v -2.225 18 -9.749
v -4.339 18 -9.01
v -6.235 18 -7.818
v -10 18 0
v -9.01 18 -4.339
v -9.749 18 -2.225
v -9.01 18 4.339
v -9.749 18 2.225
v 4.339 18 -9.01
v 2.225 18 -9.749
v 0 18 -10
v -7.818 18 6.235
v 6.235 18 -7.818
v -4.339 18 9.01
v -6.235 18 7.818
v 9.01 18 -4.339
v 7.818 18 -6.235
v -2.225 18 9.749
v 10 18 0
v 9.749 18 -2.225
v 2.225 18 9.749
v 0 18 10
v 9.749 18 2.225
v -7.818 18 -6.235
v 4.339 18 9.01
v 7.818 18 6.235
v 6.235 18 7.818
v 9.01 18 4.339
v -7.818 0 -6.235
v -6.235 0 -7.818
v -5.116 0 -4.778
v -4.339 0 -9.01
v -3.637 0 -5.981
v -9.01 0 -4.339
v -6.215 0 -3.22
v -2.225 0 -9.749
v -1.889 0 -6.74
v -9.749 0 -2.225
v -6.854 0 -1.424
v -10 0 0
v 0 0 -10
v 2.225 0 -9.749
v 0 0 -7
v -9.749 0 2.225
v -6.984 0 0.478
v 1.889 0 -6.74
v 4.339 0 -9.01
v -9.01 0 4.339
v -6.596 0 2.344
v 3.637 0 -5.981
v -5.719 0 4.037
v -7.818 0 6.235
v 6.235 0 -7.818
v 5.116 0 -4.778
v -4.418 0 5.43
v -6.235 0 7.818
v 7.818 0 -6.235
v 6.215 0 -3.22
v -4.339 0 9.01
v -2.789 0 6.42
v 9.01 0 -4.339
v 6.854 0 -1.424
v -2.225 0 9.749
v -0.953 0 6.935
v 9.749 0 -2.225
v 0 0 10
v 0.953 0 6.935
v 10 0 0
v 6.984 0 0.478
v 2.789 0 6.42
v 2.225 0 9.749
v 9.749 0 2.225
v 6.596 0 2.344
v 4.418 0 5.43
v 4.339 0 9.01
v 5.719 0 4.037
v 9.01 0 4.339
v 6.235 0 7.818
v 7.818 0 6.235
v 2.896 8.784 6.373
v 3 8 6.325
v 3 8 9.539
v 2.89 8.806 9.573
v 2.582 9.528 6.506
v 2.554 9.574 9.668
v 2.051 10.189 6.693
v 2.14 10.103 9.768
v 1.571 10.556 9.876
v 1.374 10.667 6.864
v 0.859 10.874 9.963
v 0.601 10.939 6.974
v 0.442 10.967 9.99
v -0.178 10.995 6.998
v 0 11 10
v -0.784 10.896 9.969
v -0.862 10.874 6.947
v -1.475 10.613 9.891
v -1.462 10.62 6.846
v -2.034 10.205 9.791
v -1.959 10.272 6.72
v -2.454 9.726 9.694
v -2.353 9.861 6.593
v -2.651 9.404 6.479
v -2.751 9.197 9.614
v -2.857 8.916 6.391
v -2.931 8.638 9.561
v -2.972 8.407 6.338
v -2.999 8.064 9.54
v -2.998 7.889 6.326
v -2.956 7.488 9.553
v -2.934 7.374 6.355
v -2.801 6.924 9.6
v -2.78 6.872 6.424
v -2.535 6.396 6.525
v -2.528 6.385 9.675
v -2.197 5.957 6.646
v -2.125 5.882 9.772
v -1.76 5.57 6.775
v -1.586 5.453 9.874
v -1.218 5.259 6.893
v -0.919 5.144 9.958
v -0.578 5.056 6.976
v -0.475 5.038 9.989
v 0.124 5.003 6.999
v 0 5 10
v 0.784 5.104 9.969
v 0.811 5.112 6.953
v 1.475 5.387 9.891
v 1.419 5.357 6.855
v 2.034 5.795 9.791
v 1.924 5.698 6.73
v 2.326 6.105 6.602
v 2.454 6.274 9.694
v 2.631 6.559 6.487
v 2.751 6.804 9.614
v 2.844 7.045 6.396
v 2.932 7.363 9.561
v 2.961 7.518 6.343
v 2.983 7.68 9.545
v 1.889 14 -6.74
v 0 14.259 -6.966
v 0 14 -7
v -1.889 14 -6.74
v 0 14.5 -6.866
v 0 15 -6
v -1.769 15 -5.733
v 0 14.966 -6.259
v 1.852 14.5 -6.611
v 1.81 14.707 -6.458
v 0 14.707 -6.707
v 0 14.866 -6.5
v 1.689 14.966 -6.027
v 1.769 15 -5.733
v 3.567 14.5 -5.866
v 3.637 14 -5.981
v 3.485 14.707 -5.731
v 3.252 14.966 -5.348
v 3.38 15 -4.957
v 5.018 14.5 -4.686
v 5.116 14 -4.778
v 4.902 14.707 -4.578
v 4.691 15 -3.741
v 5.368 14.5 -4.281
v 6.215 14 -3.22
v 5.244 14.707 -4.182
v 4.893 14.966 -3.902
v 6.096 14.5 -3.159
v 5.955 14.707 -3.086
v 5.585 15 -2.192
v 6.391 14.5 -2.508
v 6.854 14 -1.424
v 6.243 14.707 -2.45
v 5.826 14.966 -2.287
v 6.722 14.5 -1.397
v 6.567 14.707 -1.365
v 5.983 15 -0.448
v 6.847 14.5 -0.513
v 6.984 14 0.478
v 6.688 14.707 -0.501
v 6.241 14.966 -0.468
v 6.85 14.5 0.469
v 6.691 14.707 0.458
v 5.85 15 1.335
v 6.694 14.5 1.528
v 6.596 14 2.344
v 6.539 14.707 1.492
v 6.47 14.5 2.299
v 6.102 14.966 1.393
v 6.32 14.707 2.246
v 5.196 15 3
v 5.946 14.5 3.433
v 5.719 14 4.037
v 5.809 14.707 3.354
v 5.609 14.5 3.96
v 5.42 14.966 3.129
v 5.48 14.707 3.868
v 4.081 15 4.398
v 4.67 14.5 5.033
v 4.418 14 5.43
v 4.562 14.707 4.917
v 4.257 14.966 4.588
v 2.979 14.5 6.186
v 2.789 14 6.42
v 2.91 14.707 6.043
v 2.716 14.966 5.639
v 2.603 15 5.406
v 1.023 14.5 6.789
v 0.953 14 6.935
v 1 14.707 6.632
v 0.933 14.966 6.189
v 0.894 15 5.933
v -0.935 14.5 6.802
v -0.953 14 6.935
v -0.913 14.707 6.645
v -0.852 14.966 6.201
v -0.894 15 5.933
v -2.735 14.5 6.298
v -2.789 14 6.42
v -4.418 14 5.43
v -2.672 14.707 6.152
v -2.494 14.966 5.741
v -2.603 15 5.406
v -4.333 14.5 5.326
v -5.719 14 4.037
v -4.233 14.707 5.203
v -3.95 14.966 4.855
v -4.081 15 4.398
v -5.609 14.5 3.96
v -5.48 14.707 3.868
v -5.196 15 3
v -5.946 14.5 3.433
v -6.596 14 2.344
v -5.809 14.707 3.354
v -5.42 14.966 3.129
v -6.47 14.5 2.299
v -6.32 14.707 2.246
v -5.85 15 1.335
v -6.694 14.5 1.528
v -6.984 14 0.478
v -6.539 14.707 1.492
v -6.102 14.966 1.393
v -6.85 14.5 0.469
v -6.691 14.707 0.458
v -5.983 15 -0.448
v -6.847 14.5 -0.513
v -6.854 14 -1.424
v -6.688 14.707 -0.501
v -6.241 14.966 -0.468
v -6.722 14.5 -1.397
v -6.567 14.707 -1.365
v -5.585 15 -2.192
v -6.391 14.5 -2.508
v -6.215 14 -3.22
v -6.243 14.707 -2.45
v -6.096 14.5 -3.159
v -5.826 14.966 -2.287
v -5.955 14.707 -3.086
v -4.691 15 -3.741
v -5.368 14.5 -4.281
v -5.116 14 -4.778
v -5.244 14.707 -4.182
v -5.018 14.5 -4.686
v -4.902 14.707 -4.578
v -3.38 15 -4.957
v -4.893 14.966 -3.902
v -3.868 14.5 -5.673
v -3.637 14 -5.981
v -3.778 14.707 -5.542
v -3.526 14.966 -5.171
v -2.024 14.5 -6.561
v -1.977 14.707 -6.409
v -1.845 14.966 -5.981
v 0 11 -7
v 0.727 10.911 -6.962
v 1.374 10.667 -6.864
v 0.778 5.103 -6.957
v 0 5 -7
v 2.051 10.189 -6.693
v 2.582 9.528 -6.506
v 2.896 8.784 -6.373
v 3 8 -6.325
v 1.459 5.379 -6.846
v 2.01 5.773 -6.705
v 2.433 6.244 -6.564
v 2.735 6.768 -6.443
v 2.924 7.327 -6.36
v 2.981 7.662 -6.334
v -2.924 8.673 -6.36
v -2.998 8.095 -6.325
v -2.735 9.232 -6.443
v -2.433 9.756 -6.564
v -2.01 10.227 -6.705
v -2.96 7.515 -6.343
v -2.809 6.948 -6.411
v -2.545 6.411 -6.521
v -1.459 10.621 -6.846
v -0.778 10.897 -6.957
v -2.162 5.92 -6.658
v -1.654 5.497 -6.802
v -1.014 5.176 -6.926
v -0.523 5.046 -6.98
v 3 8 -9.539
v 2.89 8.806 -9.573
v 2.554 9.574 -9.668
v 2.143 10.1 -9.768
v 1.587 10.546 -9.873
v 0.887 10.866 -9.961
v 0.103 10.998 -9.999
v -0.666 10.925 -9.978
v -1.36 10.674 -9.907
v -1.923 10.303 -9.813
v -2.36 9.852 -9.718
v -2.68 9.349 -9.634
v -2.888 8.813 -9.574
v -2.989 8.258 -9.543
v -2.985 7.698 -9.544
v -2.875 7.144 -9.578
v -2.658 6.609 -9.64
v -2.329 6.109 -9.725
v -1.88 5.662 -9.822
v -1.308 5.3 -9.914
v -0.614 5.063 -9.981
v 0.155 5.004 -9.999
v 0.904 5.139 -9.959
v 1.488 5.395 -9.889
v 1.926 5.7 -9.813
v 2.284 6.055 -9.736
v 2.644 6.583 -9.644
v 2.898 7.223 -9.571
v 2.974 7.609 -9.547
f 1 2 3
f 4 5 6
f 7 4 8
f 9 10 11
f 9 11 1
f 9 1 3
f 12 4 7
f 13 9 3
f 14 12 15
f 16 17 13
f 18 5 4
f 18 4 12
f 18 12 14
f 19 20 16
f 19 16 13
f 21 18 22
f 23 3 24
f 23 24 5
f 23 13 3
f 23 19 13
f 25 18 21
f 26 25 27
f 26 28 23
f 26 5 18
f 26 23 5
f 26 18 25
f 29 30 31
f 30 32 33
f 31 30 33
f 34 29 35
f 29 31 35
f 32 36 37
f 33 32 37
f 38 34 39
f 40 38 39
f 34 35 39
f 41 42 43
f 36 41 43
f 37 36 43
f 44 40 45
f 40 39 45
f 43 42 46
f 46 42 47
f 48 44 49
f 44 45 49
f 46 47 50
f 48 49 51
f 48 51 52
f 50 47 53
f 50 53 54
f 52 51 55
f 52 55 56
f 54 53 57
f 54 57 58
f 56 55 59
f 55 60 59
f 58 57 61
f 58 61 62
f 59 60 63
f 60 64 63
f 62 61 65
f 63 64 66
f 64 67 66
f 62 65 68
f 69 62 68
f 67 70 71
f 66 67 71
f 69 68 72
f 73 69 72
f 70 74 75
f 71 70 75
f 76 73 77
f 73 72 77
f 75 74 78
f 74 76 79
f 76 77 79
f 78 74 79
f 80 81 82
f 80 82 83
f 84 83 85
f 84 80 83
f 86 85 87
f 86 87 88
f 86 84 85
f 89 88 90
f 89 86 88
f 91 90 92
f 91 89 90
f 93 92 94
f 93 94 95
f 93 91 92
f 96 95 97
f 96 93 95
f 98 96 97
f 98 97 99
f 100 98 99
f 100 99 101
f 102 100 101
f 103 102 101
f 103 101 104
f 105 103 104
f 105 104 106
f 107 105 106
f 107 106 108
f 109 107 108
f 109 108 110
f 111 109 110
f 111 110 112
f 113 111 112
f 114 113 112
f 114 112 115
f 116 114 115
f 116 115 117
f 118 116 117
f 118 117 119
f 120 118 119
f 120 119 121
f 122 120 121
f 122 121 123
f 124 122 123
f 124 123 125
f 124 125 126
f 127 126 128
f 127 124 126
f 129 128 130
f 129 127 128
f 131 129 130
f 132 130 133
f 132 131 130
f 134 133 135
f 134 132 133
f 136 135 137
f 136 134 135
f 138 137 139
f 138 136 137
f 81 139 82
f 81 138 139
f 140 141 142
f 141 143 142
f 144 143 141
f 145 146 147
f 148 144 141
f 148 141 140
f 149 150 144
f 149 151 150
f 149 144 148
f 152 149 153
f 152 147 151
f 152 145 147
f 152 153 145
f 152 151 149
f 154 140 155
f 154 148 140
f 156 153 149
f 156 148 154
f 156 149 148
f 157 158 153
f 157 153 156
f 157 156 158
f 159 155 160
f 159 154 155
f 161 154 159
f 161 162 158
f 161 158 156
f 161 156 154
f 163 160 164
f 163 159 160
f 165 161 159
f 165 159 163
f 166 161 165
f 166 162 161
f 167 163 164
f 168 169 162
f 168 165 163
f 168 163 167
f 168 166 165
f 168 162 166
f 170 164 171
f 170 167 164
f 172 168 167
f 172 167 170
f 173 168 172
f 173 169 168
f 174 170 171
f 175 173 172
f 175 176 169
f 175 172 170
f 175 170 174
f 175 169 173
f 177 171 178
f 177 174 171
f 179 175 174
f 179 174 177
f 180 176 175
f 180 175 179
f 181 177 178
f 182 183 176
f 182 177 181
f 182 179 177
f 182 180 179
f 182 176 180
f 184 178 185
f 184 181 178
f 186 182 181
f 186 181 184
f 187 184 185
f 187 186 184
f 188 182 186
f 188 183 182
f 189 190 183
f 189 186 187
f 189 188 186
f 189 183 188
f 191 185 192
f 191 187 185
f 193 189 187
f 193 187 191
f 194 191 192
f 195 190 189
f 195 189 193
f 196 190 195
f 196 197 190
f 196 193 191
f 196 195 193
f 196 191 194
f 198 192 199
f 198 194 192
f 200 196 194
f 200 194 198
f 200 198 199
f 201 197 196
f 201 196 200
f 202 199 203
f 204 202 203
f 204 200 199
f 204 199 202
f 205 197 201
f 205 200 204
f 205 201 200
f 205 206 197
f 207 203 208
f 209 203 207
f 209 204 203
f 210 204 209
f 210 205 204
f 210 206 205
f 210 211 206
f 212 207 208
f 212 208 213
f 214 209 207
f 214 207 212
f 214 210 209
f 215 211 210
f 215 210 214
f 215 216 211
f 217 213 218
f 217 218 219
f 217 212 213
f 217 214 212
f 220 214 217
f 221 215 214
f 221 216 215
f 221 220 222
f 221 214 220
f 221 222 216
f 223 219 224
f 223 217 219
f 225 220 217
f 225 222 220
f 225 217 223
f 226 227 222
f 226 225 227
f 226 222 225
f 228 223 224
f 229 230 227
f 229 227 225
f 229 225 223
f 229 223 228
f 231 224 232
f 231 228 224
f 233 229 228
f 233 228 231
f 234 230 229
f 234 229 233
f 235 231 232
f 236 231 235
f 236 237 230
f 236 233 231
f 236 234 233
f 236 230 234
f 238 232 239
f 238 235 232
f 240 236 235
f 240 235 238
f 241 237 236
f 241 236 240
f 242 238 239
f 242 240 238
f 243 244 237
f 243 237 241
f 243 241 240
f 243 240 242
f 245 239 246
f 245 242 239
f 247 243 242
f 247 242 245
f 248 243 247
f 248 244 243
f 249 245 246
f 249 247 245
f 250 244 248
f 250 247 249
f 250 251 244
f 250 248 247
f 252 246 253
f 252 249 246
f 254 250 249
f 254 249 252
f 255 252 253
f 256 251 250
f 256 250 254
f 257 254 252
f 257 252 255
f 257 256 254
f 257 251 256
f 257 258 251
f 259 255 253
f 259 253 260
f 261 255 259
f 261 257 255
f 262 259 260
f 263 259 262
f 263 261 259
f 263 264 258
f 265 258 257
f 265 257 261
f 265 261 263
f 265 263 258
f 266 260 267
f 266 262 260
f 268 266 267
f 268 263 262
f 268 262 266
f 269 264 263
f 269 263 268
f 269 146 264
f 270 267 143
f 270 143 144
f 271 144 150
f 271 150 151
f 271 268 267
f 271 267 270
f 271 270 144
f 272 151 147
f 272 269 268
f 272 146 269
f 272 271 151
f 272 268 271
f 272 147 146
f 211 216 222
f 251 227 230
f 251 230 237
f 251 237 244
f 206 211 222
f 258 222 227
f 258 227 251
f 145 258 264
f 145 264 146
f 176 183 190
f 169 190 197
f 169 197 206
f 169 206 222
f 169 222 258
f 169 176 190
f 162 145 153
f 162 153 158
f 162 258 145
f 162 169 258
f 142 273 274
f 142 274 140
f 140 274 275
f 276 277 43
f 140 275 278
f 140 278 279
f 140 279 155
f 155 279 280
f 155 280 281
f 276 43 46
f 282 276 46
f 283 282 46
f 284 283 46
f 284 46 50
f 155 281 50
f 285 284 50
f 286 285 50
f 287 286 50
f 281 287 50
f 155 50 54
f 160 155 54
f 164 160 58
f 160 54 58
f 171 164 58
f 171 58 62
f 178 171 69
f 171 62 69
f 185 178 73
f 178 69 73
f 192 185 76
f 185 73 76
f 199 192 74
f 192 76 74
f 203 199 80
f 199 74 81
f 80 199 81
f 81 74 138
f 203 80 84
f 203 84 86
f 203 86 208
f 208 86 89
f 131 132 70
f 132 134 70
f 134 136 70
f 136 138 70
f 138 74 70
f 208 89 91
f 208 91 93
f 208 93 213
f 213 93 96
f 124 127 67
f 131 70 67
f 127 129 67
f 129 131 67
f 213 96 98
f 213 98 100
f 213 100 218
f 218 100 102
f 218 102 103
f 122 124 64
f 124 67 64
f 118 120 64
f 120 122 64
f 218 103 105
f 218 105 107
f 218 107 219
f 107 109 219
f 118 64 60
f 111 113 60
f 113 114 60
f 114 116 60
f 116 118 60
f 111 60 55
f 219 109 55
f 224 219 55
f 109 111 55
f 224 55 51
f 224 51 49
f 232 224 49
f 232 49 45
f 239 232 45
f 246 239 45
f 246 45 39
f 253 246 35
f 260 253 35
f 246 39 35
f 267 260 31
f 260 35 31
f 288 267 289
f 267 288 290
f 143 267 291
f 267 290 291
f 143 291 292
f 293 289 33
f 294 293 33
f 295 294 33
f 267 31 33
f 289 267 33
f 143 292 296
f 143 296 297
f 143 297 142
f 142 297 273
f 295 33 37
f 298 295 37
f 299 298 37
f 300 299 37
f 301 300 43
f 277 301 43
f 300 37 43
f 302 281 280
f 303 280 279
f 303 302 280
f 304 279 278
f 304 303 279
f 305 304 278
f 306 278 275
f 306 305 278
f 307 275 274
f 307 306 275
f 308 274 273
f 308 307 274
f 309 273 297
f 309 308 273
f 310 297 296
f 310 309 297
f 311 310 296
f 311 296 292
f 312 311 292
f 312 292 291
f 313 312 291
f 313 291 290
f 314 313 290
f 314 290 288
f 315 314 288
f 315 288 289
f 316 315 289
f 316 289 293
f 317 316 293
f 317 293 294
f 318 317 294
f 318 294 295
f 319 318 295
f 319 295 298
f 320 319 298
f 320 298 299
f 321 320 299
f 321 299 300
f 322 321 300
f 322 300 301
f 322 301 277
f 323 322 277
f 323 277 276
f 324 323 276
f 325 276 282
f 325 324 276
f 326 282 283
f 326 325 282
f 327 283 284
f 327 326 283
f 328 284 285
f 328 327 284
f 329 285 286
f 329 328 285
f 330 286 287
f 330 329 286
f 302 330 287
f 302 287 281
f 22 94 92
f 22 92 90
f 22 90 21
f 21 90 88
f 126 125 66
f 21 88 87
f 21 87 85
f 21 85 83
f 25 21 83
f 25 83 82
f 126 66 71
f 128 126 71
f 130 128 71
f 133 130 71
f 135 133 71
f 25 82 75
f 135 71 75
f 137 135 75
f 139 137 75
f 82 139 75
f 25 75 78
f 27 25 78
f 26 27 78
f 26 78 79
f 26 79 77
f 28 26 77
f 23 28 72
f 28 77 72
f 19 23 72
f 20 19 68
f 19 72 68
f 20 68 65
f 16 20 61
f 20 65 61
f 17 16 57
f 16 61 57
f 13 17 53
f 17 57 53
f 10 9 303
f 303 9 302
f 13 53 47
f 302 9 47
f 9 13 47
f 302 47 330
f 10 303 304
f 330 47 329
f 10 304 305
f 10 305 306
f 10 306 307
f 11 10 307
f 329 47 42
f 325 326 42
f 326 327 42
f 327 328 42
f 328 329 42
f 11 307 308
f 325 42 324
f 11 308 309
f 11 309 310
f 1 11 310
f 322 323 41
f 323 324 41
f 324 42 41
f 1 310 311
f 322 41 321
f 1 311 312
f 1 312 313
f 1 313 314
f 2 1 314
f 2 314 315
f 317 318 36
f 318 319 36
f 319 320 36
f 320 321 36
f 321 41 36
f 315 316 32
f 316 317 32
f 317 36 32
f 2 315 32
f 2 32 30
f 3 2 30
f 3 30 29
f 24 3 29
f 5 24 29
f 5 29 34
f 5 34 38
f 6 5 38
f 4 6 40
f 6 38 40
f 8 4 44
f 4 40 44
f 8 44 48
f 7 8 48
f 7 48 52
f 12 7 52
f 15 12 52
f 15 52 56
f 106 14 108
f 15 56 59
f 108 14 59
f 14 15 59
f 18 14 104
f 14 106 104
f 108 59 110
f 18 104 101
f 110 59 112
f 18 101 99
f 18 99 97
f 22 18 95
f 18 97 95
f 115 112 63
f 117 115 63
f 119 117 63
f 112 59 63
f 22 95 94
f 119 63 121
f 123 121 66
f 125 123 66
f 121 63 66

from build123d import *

# Parameters (mm, degrees)
SKETCH1_R               = 10
BOSS_EXTRUDE1_DEPTH     = 18
SKETCH2_R               = 7
CUT_EXTRUDE1_DEPTH      = 15
CUT_EXTRUDE3_DEPTH      = 23.891046285
CUT_EXTRUDE3_DEPTH_BACK = 23.891046285
SKETCH4_R               = 3
FILLET1_R               = 1


with BuildPart() as part:
    # Sketch1 → Boss-Extrude1 (new body)
    with BuildSketch(Plane(origin=(0, 0, 0), x_dir=(1, 0, 0), z_dir=(0, 1, 0))):
        with Locations(Location((0, 0, 0), (0, 0, 270))):
            Circle(SKETCH1_R)
    extrude(amount=BOSS_EXTRUDE1_DEPTH)

    # Sketch2 → Cut-Extrude1 (cut)
    with BuildSketch(Plane(origin=(0, 0, 0), x_dir=(-1, 0, 0), z_dir=(0, -1, 0))):
        with Locations(Location((0, 0, 0), (0, 0, 90))):
            Circle(SKETCH2_R)
    extrude(amount=-CUT_EXTRUDE1_DEPTH, mode=Mode.SUBTRACT)

    # Sketch4 → Cut-Extrude3 (cut, two sides: drawn at the far end of the back side and taken through both)
    with BuildSketch(Plane.XY.offset(-CUT_EXTRUDE3_DEPTH_BACK)):
        with Locations((0, 8)):
            Circle(SKETCH4_R)
    extrude(amount=CUT_EXTRUDE3_DEPTH + CUT_EXTRUDE3_DEPTH_BACK, mode=Mode.SUBTRACT)

    # Fillet1
    fillet1_edges = [part.edges().sort_by_distance(p)[0] for p in [
        (0, 15, 7),
    ]]
    fillet(fillet1_edges, radius=FILLET1_R)


solid = part.part
